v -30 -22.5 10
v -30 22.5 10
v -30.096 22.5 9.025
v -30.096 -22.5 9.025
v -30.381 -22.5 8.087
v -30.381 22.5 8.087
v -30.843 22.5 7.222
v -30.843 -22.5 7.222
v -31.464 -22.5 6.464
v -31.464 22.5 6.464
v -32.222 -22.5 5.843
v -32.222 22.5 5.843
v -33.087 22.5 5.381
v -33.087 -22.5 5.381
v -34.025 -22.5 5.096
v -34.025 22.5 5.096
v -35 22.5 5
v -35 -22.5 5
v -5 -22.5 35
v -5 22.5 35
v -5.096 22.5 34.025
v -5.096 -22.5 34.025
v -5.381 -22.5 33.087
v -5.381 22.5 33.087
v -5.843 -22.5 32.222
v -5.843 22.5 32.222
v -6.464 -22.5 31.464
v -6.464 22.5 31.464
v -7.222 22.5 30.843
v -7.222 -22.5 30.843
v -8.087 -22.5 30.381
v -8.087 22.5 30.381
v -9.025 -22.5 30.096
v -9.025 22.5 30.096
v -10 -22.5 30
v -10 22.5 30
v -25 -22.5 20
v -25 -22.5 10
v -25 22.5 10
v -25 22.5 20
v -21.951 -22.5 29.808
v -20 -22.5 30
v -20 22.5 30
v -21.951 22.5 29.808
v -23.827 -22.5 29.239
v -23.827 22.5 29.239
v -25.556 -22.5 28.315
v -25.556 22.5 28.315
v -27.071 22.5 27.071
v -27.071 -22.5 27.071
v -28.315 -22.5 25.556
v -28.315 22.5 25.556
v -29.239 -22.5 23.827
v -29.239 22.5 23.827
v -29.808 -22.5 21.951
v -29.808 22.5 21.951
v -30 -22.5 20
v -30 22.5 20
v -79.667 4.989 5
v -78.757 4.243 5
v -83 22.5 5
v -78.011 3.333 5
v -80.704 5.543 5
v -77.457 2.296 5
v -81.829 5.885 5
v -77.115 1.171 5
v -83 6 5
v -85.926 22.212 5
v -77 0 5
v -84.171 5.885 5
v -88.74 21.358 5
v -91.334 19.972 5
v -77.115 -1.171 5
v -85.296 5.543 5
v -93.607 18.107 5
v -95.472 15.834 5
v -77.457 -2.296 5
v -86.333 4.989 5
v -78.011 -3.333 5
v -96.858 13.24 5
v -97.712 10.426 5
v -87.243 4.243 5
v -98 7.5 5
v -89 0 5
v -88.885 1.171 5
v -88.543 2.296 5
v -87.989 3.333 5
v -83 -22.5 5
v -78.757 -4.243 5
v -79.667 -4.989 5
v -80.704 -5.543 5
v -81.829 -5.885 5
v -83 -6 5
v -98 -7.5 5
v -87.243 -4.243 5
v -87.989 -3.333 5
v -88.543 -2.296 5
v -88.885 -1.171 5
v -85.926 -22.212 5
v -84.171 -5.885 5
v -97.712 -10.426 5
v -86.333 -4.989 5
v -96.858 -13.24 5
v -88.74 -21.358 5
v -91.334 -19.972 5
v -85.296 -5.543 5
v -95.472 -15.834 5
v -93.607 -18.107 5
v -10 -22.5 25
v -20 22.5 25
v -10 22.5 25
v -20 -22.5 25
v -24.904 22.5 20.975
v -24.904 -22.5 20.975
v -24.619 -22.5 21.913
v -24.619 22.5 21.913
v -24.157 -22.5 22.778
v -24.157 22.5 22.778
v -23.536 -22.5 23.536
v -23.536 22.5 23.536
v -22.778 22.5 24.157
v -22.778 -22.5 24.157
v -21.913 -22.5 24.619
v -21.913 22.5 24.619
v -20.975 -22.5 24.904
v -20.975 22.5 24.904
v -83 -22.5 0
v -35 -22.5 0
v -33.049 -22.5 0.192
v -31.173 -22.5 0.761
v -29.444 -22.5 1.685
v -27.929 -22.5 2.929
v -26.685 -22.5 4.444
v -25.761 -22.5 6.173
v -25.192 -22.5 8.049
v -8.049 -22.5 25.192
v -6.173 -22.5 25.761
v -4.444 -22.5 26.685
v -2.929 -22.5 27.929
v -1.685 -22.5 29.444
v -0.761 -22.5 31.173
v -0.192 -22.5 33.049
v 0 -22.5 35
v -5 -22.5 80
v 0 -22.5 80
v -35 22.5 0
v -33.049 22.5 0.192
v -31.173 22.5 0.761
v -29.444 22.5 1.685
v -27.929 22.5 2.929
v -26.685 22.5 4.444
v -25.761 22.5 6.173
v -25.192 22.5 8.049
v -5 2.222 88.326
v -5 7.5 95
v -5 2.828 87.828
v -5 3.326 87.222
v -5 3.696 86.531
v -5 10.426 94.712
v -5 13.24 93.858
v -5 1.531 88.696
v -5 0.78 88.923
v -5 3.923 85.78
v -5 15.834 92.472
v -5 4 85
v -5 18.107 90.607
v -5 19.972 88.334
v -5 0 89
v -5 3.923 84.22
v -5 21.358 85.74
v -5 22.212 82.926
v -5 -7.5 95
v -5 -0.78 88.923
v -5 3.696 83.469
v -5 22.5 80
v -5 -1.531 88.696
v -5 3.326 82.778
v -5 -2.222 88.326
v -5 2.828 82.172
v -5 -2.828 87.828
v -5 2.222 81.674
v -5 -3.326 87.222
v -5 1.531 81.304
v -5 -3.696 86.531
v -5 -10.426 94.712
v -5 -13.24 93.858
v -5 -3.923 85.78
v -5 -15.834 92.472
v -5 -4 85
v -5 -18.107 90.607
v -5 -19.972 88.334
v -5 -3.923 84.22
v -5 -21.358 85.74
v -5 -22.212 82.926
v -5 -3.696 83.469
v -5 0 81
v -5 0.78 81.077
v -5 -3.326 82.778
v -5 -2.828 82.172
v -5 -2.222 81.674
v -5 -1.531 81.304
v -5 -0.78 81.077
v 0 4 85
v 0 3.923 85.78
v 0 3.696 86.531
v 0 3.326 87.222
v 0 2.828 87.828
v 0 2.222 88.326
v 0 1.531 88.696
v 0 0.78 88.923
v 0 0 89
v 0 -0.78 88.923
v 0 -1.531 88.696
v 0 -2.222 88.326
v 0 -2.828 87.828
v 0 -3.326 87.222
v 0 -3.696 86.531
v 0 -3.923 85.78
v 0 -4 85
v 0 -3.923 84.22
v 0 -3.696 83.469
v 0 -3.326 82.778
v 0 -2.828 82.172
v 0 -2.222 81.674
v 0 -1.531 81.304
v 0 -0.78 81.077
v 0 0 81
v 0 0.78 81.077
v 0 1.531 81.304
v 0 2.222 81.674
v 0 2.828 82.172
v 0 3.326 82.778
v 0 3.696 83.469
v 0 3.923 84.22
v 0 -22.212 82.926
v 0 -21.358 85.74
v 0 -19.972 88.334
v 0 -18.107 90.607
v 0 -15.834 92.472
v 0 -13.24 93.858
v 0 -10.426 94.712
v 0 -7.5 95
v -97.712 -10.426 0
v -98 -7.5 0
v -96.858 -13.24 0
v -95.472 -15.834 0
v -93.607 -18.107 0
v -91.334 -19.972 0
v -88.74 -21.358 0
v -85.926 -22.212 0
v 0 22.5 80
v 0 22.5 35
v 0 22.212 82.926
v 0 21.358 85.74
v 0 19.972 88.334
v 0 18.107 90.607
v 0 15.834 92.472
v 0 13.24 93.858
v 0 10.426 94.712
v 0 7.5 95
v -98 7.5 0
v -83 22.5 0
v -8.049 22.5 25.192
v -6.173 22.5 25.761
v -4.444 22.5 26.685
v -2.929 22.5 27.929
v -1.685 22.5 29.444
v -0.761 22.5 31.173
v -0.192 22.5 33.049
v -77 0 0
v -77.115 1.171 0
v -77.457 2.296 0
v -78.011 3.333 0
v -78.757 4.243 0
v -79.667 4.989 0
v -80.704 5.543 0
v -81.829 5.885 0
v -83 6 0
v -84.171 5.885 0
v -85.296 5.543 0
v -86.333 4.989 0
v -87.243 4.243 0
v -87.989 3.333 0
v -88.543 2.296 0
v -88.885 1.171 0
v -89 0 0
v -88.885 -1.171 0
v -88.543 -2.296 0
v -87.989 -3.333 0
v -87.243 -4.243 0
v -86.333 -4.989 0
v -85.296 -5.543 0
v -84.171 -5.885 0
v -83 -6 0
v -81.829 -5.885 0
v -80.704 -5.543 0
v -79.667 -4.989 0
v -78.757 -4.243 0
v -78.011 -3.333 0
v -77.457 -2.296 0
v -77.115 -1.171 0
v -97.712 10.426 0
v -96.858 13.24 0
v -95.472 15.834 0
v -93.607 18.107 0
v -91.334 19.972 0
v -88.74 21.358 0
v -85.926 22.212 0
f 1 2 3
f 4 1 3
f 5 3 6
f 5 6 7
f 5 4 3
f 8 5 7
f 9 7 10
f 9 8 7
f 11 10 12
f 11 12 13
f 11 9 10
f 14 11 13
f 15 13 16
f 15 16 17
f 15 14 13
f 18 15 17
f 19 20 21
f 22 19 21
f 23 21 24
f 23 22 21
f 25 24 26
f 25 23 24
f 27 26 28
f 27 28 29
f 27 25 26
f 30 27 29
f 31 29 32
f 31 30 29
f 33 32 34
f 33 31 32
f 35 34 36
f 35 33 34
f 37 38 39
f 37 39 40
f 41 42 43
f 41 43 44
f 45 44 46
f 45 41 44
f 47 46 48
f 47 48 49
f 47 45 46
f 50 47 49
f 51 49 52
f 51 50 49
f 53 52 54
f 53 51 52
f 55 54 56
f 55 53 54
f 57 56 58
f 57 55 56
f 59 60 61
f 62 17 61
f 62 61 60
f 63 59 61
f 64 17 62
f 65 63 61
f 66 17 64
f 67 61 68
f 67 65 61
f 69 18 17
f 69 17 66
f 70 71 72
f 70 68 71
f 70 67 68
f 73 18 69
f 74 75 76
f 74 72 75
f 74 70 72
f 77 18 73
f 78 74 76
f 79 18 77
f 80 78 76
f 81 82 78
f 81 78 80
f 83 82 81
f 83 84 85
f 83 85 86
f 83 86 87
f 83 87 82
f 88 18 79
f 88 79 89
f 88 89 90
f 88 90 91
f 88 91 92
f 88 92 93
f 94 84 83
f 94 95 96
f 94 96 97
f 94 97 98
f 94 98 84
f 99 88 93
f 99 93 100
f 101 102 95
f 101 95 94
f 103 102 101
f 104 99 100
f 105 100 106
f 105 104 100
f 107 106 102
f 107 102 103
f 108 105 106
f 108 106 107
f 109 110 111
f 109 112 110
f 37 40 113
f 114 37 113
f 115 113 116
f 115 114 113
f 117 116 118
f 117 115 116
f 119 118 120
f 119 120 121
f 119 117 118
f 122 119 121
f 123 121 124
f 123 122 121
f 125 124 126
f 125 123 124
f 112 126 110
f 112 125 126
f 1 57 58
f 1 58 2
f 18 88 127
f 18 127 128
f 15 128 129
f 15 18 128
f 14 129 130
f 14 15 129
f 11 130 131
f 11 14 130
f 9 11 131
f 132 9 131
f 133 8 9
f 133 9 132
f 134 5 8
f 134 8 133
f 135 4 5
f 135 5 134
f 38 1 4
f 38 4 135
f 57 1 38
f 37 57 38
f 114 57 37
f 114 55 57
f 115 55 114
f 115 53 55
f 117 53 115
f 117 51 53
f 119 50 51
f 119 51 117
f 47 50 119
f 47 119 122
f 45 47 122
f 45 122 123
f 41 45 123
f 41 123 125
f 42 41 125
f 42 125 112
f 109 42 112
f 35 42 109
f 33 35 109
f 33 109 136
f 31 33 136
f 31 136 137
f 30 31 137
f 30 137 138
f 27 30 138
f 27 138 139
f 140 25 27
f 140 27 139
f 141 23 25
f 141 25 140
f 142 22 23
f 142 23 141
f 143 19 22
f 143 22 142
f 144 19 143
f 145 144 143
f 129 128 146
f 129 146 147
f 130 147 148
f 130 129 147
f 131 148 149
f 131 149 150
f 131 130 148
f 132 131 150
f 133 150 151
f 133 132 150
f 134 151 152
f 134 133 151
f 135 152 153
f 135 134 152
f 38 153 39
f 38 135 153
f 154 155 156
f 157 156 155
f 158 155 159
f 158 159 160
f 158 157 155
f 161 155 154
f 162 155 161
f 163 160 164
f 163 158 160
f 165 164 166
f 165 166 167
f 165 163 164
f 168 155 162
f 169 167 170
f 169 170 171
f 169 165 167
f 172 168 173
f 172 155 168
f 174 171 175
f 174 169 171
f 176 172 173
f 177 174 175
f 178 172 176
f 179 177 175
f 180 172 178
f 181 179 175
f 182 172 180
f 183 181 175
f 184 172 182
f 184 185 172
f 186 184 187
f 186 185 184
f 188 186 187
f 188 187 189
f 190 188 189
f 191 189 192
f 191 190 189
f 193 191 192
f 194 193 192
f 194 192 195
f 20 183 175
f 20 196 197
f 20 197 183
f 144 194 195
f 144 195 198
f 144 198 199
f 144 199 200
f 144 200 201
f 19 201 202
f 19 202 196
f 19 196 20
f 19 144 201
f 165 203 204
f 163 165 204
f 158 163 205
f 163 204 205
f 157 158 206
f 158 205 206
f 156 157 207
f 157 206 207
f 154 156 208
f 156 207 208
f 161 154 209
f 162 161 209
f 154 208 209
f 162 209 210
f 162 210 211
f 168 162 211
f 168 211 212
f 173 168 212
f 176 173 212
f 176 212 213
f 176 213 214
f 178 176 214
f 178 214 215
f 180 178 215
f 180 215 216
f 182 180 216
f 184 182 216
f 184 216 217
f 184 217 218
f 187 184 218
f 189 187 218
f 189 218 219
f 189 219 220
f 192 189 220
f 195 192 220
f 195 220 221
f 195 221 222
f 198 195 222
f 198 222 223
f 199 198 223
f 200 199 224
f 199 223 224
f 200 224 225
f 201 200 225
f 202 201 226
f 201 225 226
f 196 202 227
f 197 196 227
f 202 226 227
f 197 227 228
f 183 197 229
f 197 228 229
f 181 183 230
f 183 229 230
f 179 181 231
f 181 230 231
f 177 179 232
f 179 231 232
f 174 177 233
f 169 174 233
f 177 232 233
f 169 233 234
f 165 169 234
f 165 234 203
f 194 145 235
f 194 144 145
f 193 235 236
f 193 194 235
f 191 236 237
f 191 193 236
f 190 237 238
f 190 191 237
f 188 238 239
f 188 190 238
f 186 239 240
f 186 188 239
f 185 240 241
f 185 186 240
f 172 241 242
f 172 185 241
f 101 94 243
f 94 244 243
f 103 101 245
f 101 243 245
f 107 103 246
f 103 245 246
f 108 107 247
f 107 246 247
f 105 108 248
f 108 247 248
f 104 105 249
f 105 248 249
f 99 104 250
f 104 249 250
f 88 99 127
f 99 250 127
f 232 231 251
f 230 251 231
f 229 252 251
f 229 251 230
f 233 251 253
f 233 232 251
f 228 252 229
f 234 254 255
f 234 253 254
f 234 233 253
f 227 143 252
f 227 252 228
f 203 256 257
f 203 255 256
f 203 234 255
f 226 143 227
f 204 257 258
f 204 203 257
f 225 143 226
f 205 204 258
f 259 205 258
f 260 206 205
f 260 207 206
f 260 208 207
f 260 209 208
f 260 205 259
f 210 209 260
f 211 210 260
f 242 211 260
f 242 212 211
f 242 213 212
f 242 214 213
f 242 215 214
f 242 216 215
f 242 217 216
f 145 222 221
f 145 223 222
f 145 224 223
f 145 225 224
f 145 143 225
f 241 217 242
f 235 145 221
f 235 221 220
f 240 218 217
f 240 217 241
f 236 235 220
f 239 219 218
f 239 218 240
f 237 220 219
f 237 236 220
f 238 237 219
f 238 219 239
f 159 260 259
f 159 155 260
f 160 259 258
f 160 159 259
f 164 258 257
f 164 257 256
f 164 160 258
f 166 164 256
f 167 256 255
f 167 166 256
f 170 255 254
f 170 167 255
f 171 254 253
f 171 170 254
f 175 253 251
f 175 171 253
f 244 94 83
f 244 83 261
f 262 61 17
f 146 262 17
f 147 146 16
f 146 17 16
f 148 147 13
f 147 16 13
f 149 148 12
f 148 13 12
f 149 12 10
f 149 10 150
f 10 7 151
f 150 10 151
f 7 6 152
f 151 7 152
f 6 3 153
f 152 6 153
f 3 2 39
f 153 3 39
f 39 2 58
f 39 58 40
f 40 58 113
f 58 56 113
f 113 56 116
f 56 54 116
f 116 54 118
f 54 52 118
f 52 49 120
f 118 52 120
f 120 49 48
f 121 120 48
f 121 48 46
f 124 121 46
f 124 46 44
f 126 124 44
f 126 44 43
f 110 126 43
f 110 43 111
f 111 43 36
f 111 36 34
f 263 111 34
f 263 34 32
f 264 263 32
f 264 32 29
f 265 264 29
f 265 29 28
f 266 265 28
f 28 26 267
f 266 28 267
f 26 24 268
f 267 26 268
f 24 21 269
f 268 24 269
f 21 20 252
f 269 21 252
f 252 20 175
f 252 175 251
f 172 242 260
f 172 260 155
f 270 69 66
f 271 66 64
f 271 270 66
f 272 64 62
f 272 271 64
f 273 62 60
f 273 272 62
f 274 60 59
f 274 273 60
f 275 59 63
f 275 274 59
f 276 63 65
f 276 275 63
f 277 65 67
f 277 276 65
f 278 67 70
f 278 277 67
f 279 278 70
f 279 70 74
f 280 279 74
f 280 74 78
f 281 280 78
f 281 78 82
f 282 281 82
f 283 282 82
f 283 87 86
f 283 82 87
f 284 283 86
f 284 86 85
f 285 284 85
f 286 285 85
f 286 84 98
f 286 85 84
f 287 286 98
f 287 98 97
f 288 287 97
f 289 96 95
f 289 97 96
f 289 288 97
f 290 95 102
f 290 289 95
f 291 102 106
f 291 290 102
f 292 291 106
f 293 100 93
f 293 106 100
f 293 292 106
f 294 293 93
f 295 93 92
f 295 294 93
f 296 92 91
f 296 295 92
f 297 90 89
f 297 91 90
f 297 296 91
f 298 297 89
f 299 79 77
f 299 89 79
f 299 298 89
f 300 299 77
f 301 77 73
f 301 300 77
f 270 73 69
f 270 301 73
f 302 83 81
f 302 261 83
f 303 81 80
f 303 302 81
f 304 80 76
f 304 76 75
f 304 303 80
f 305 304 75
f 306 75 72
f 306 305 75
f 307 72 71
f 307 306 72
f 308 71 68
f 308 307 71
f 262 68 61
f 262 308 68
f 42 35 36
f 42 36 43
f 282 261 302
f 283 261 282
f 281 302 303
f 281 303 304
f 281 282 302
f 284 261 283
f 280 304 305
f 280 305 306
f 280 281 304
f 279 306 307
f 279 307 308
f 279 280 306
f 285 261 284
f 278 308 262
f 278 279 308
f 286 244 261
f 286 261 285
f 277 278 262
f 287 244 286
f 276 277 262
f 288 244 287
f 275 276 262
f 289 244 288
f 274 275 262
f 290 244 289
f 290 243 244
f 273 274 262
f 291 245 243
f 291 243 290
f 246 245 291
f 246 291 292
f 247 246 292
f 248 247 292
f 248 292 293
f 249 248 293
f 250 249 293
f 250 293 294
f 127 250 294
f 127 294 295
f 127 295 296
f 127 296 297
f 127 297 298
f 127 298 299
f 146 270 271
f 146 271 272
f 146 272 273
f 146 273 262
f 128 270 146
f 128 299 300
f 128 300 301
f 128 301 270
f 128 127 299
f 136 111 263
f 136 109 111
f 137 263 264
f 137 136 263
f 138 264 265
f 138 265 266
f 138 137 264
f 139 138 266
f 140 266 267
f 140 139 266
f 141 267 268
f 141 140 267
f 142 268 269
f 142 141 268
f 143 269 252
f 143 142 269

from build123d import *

# Parameters (mm, degrees)
F1_DEPTH = 22.5
F2_R     = 15
F3_R     = 4
F4_DEPTH = 98.001
F5_R     = 6
F6_DEPTH = 25


with BuildPart() as f1:
    # F0 (on Front) → F1 (new body, symmetric)
    with BuildSketch(Plane.XZ):
        with BuildLine():
            Line((0, 35), (0, 95))
            Line((0, 95), (-5, 95))
            Line((-5, 95), (-5, 35))
            ThreePointArc((-5, 35), (-6.464466, 31.464466), (-10, 30))
            Line((-10, 30), (-20, 30))
            ThreePointArc((-20, 30), (-27.071068, 27.071068), (-30, 20))
            Line((-30, 20), (-30, 10))
            ThreePointArc((-30, 10), (-31.464466, 6.464466), (-35, 5))
            Line((-35, 5), (-98, 5))
            Line((-98, 5), (-98, 0))
            Line((-98, 0), (-35, 0))
            ThreePointArc((-35, 0), (-27.928932, 2.928932), (-25, 10))
            Line((-25, 10), (-25, 20))
            ThreePointArc((-25, 20), (-23.535534, 23.535534), (-20, 25))
            Line((-20, 25), (-10, 25))
            ThreePointArc((-10, 25), (-2.928932, 27.928932), (0, 35))
        make_face()
    extrude(amount=F1_DEPTH, both=True)

    # F2
    f2_edges = [f1.edges().sort_by_distance(p)[0] for p in [
        (-98, -22.5, 2.5),
        (-2.5, -22.5, 95),
        (-2.5, 22.5, 95),
        (-98, 22.5, 2.5),
    ]]
    fillet(f2_edges, radius=F2_R)

    # F3 (on face) → F4 (cut, through all)
    with BuildSketch(Plane.YZ):
        with Locations((0, 85)):
            Circle(F3_R)
    extrude(amount=-F4_DEPTH, mode=Mode.SUBTRACT)

    # F5 (on Top) → F6 (cut)
    with BuildSketch(Plane.XY):
        with Locations((-83, 0)):
            Circle(F5_R)
    extrude(amount=F6_DEPTH, mode=Mode.SUBTRACT)


solid = f1.part
